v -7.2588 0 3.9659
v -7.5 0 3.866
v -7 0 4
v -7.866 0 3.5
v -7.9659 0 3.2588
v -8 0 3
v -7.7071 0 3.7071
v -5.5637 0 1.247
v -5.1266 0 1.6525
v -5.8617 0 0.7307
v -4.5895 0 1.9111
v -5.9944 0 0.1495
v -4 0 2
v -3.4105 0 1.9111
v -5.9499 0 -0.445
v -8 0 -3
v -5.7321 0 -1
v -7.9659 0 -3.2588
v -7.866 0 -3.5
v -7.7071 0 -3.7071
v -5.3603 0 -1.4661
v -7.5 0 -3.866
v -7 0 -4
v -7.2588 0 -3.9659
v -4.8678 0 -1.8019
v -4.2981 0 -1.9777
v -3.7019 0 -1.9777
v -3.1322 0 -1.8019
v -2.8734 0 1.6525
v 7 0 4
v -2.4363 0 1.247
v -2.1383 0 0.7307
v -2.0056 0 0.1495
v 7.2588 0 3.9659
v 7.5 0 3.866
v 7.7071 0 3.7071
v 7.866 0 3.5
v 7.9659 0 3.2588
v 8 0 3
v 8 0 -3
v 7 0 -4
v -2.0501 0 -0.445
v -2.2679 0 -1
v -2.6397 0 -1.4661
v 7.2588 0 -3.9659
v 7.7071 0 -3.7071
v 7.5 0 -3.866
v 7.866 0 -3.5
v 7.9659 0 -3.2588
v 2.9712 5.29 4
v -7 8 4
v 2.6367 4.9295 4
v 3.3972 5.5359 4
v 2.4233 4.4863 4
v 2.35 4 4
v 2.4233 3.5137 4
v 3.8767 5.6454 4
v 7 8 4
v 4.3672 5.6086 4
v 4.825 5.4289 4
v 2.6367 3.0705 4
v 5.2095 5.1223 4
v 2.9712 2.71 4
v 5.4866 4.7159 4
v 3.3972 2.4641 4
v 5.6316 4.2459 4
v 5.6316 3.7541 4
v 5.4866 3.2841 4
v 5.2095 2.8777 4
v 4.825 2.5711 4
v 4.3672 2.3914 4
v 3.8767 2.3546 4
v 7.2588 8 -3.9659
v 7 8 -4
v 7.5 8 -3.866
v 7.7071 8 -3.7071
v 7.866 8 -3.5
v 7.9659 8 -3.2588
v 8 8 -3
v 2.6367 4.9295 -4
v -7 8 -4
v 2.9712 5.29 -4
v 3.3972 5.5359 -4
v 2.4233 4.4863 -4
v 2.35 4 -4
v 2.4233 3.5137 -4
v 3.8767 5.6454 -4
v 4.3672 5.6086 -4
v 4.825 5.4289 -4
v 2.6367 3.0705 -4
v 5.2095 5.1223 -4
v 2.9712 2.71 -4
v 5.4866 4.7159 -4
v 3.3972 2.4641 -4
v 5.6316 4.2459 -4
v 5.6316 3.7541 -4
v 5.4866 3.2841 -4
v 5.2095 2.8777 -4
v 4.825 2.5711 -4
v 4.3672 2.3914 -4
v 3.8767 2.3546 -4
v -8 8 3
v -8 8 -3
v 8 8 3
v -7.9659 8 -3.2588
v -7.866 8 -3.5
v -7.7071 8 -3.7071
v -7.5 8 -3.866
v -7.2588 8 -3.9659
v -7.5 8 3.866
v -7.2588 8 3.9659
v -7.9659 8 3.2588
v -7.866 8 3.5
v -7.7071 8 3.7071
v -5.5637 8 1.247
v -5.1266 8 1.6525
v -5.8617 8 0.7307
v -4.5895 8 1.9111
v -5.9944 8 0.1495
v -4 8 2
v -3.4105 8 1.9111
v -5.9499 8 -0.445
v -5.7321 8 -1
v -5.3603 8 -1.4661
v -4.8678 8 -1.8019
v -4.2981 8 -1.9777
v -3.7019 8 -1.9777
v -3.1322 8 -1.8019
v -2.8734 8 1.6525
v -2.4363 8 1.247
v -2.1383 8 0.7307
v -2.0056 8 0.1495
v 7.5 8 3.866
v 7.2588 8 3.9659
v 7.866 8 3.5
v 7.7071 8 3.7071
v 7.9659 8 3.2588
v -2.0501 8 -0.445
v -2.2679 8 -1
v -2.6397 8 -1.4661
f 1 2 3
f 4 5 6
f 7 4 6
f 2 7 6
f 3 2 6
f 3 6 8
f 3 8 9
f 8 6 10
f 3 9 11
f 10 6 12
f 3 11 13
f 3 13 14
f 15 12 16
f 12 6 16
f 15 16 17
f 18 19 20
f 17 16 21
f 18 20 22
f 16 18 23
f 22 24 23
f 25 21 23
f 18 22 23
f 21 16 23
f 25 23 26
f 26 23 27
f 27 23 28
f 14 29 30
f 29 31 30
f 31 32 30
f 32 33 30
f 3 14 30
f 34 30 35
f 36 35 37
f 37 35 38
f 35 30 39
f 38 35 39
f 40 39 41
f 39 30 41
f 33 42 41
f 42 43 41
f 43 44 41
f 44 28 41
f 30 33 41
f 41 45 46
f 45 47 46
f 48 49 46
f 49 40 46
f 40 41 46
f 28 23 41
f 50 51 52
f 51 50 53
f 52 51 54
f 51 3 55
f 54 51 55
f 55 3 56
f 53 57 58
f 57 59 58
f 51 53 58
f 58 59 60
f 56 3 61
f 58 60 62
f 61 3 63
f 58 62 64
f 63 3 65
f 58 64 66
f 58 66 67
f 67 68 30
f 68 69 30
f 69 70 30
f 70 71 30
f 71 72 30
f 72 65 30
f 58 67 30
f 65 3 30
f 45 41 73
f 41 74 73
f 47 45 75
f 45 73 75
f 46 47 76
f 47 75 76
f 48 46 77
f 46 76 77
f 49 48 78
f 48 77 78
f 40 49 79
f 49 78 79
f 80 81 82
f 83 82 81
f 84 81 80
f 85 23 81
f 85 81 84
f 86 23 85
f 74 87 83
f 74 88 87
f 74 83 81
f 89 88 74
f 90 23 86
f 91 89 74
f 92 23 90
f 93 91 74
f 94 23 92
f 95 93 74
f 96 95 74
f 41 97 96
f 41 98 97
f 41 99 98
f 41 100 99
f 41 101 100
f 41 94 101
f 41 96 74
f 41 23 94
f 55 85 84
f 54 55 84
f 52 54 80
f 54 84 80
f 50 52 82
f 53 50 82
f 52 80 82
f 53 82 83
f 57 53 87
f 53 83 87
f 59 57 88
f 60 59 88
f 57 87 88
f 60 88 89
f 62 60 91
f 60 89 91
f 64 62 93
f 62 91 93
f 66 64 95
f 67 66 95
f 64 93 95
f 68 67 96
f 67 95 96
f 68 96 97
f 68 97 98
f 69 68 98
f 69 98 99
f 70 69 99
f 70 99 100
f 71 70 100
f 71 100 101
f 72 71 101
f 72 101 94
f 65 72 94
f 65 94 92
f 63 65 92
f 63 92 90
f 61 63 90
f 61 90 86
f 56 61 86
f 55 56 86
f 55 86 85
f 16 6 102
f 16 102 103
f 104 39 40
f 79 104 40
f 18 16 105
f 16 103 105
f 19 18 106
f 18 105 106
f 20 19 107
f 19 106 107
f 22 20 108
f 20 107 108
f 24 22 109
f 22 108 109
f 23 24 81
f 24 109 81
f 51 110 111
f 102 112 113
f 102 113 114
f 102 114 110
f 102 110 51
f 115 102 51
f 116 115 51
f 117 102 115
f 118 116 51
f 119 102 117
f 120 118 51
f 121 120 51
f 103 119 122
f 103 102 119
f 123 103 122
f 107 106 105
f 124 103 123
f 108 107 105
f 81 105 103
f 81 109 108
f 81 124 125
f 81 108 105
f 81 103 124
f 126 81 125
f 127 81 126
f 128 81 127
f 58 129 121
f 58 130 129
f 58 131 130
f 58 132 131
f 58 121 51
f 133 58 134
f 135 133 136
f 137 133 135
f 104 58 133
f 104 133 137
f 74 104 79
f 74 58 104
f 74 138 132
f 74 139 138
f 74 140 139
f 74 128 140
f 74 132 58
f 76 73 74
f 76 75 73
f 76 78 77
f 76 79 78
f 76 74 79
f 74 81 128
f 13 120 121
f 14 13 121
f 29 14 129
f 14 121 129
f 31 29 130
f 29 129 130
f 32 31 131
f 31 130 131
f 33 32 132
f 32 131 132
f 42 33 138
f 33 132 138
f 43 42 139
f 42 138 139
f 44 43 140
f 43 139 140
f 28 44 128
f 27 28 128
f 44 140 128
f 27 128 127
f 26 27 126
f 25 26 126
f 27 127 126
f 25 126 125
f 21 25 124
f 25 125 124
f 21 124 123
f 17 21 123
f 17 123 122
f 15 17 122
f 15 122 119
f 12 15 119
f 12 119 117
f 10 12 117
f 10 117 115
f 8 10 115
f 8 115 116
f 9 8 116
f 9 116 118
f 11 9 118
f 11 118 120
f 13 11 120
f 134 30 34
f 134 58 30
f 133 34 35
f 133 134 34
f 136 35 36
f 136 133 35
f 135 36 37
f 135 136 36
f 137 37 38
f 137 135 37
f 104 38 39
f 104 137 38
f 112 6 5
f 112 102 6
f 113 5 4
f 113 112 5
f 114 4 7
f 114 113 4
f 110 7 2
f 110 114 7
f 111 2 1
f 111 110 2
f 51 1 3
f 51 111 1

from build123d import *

# Parameters (mm, degrees)
SKETCH_1_W             = 16
SKETCH_1_H             = 8
EXTRUDE_1_DEPTH        = 8
HOLE_WIZARD_M4_2_D     = 3.3
HOLE_WIZARD_M4_2_DEPTH = 11.6
HOLE_WIZARD_M4_2_TIP   = 0.991420021
FILLET_1_R             = 1
SKETCH_7_R             = 2
CUT_EXTRUDE_1_DEPTH    = 10


with BuildPart() as part:
    # 草图1 → 凸台-拉伸1 (new body)
    with BuildSketch(Plane(origin=(0, 0, 0), x_dir=(1, 0, 0), z_dir=(0, 1, 0))):
        Rectangle(SKETCH_1_W, SKETCH_1_H)
    extrude(amount=EXTRUDE_1_DEPTH)

    # M4 螺纹孔2
    with Locations(Plane.XY.offset(4)):
        with Locations((4, 4)):
            Hole(HOLE_WIZARD_M4_2_D / 2, depth=HOLE_WIZARD_M4_2_DEPTH)
            with Locations((0, 0, -(HOLE_WIZARD_M4_2_DEPTH + HOLE_WIZARD_M4_2_TIP / 2))):  # 118° drill point
                Cone(0, HOLE_WIZARD_M4_2_D / 2, HOLE_WIZARD_M4_2_TIP, mode=Mode.SUBTRACT)

    # 圆角1
    fillet_1_edges = [part.edges().sort_by_distance(p)[0] for p in [
        (8, 4, 4),
        (-8, 4, 4),
        (-8, 4, -4),
        (8, 4, -4),
    ]]
    fillet(fillet_1_edges, radius=FILLET_1_R)

    # 草图7 → 切除-拉伸1 (cut)
    with BuildSketch(Plane(origin=(0, 8, 0), x_dir=(1, 0, 0), z_dir=(0, 1, 0))):
        with Locations(Location((-4, 0, 0), (0, 0, 270))):
            Circle(SKETCH_7_R)
    extrude(amount=-CUT_EXTRUDE_1_DEPTH, mode=Mode.SUBTRACT)


solid = part.part
